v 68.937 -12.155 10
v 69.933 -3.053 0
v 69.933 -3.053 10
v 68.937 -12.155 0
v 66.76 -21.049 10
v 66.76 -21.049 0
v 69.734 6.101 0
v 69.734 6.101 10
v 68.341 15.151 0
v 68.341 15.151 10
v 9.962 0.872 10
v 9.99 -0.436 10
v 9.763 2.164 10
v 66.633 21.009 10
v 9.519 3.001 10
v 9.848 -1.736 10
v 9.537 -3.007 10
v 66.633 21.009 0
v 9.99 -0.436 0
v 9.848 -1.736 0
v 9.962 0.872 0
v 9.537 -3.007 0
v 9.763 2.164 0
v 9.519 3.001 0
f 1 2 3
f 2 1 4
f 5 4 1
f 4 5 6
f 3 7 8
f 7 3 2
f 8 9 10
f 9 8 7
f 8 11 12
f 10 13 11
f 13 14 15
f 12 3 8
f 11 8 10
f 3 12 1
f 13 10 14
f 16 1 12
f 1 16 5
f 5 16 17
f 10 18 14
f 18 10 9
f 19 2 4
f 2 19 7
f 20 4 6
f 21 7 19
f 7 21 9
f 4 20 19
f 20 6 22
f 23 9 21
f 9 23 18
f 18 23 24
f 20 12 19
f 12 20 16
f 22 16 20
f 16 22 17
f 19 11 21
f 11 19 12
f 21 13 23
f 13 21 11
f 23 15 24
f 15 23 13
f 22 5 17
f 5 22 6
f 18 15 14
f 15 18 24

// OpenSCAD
// file: ../utils/motor.scad
// for local tests only
//motor();

// measured dimensions
motor_total_length=71.35;
motor_block_length=47.3;
motor_block_side=42.3;
motor_block_flat_diameter=53.6;
motor_block_and_disk_length=49;
motor_disk_diameter=22;
motor_disk_length=motor_block_and_disk_length - motor_block_length;
motor_axis_length=motor_total_length - motor_block_and_disk_length;
motor_axis_diameter=5;
motor_axis_diameter_flat=4.5;
motor_axis_radius=motor_axis_diameter / 2;
motor_axis_radius_flat=motor_axis_diameter_flat - motor_axis_radius;

module motor(axis_angle=90) {
    rotate([0,axis_angle,0])
    motor_axis();
    motor_block();
}

module motor_axis(radiusPadding=0, with_flat_section=true) {
    difference() {
        rotate([90,0,0])
        cylinder(motor_axis_length,r=motor_axis_radius+radiusPadding,center=false,$fn=100);
        
        if (with_flat_section) {
            translate([-5,-motor_axis_length-1,motor_axis_radius_flat])
            cube([10,motor_axis_length+2,10],center=false);
        }
    }
}

module motor_block() {
    rotate([90,0,0])
    translate([0,0,-motor_disk_length])
    cylinder(motor_disk_length,r=motor_disk_diameter/2,center=false,$fn=30);
        
    difference() {
        rotate([90,0,0])
        translate([-motor_block_side/2,-motor_block_side/2,-motor_block_length-motor_disk_length])
        cube([motor_block_side,motor_block_side,motor_block_length],center=false);
        
        for(i=[0:1:3]) {
            rotate([0,45+90*i,0])
            translate([0,0,motor_block_flat_diameter/2])
            motor_block_edge_cutter();
        }
    }
}

module motor_block_edge_cutter() {
    rotate([90,0,0])
    translate([-motor_block_side/2,0,-motor_block_length-motor_disk_length-1])
    cube([motor_block_side,10,motor_block_length+2],center=false);
}
// file: params.scad
include <../utils/motor.scad>

thickness=1;
clearance=0.3;

reservoirR=70;
reservoirH=150;

carouselH=10;
carouselHoleAngle=25;

bottomH = motor_block_and_disk_length + thickness + clearance * 2;
// main file
include <params.scad>


// for tests
//cut([0,1,0])
hole_shape(reservoirR, 10, 35);


module hole_shape(radius, inner_radius, angle, thickness=10) {
    rotate([0, 0, -angle/2])
    difference() {
        cylinder(thickness, r=radius, center=false, $fn=48);
        
        translate([0, 0, -1])
        cylinder(thickness*2, r=inner_radius, center=false, $fn=48);
        
        // remove bottom half
        translate([-radius*2, -radius*2, -1])
        cube([radius*4, radius*2, thickness*2]);
        
        // remove left half
        translate([-radius*2, -radius*2, -1])
        cube([radius*2, radius*4, thickness*2]);

        // remove the rest
        rotate([0, 0, angle])
        translate([0, 0, -1])
        cube([radius*2, radius*2, thickness*2]);
    }
}
